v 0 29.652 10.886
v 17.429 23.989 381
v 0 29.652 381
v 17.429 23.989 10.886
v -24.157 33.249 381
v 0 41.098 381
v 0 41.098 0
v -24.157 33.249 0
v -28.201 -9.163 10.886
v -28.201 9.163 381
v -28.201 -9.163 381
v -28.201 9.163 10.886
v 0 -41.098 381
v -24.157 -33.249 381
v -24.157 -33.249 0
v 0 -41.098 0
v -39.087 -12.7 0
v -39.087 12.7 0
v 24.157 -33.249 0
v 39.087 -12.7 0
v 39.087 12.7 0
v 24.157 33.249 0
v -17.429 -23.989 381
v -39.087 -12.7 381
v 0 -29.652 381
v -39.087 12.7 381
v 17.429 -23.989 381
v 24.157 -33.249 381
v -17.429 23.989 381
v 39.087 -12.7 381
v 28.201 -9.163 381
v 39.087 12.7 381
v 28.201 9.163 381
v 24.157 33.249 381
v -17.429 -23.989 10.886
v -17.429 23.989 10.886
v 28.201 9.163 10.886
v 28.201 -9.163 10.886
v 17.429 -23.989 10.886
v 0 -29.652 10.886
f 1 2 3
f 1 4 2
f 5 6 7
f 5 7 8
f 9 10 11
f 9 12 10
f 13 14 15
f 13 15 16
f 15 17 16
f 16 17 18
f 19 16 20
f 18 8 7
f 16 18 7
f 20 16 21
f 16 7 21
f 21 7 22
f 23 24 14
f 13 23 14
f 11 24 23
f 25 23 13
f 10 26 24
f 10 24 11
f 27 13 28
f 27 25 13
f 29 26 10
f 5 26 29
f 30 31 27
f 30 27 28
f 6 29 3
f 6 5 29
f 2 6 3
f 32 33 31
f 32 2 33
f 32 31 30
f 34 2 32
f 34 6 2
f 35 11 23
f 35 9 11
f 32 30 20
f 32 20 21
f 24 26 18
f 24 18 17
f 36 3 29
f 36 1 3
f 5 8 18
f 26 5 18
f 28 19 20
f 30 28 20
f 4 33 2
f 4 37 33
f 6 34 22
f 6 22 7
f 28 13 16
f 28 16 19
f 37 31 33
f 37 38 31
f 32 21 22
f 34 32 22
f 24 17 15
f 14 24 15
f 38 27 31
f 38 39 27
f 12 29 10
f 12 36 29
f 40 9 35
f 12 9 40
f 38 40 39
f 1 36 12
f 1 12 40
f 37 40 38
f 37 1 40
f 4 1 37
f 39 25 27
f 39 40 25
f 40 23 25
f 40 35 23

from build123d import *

# Parameters (mm, degrees)
F1_DEPTH = 381
F2_T     = -10.885714


with BuildPart() as f1:
    # F0 (on Top) → F1 (new body)
    with BuildSketch(Plane.XY):
        Polygon((39.086581, -12.7), (39.086581, 12.7), (24.156836, 33.249032), (0, 41.098063), (-24.156836, 33.249032), (-39.086581, 12.7), (-39.086581, -12.7), (-24.156836, -33.249032), (0, -41.098063), (24.156836, -33.249032), align=None)
    extrude(amount=F1_DEPTH)

    # F2
    f2_openings = [f1.faces().sort_by_distance(p)[0] for p in [
        (0, 0, 381),
    ]]
    offset(amount=F2_T, openings=f2_openings)


solid = f1.part
